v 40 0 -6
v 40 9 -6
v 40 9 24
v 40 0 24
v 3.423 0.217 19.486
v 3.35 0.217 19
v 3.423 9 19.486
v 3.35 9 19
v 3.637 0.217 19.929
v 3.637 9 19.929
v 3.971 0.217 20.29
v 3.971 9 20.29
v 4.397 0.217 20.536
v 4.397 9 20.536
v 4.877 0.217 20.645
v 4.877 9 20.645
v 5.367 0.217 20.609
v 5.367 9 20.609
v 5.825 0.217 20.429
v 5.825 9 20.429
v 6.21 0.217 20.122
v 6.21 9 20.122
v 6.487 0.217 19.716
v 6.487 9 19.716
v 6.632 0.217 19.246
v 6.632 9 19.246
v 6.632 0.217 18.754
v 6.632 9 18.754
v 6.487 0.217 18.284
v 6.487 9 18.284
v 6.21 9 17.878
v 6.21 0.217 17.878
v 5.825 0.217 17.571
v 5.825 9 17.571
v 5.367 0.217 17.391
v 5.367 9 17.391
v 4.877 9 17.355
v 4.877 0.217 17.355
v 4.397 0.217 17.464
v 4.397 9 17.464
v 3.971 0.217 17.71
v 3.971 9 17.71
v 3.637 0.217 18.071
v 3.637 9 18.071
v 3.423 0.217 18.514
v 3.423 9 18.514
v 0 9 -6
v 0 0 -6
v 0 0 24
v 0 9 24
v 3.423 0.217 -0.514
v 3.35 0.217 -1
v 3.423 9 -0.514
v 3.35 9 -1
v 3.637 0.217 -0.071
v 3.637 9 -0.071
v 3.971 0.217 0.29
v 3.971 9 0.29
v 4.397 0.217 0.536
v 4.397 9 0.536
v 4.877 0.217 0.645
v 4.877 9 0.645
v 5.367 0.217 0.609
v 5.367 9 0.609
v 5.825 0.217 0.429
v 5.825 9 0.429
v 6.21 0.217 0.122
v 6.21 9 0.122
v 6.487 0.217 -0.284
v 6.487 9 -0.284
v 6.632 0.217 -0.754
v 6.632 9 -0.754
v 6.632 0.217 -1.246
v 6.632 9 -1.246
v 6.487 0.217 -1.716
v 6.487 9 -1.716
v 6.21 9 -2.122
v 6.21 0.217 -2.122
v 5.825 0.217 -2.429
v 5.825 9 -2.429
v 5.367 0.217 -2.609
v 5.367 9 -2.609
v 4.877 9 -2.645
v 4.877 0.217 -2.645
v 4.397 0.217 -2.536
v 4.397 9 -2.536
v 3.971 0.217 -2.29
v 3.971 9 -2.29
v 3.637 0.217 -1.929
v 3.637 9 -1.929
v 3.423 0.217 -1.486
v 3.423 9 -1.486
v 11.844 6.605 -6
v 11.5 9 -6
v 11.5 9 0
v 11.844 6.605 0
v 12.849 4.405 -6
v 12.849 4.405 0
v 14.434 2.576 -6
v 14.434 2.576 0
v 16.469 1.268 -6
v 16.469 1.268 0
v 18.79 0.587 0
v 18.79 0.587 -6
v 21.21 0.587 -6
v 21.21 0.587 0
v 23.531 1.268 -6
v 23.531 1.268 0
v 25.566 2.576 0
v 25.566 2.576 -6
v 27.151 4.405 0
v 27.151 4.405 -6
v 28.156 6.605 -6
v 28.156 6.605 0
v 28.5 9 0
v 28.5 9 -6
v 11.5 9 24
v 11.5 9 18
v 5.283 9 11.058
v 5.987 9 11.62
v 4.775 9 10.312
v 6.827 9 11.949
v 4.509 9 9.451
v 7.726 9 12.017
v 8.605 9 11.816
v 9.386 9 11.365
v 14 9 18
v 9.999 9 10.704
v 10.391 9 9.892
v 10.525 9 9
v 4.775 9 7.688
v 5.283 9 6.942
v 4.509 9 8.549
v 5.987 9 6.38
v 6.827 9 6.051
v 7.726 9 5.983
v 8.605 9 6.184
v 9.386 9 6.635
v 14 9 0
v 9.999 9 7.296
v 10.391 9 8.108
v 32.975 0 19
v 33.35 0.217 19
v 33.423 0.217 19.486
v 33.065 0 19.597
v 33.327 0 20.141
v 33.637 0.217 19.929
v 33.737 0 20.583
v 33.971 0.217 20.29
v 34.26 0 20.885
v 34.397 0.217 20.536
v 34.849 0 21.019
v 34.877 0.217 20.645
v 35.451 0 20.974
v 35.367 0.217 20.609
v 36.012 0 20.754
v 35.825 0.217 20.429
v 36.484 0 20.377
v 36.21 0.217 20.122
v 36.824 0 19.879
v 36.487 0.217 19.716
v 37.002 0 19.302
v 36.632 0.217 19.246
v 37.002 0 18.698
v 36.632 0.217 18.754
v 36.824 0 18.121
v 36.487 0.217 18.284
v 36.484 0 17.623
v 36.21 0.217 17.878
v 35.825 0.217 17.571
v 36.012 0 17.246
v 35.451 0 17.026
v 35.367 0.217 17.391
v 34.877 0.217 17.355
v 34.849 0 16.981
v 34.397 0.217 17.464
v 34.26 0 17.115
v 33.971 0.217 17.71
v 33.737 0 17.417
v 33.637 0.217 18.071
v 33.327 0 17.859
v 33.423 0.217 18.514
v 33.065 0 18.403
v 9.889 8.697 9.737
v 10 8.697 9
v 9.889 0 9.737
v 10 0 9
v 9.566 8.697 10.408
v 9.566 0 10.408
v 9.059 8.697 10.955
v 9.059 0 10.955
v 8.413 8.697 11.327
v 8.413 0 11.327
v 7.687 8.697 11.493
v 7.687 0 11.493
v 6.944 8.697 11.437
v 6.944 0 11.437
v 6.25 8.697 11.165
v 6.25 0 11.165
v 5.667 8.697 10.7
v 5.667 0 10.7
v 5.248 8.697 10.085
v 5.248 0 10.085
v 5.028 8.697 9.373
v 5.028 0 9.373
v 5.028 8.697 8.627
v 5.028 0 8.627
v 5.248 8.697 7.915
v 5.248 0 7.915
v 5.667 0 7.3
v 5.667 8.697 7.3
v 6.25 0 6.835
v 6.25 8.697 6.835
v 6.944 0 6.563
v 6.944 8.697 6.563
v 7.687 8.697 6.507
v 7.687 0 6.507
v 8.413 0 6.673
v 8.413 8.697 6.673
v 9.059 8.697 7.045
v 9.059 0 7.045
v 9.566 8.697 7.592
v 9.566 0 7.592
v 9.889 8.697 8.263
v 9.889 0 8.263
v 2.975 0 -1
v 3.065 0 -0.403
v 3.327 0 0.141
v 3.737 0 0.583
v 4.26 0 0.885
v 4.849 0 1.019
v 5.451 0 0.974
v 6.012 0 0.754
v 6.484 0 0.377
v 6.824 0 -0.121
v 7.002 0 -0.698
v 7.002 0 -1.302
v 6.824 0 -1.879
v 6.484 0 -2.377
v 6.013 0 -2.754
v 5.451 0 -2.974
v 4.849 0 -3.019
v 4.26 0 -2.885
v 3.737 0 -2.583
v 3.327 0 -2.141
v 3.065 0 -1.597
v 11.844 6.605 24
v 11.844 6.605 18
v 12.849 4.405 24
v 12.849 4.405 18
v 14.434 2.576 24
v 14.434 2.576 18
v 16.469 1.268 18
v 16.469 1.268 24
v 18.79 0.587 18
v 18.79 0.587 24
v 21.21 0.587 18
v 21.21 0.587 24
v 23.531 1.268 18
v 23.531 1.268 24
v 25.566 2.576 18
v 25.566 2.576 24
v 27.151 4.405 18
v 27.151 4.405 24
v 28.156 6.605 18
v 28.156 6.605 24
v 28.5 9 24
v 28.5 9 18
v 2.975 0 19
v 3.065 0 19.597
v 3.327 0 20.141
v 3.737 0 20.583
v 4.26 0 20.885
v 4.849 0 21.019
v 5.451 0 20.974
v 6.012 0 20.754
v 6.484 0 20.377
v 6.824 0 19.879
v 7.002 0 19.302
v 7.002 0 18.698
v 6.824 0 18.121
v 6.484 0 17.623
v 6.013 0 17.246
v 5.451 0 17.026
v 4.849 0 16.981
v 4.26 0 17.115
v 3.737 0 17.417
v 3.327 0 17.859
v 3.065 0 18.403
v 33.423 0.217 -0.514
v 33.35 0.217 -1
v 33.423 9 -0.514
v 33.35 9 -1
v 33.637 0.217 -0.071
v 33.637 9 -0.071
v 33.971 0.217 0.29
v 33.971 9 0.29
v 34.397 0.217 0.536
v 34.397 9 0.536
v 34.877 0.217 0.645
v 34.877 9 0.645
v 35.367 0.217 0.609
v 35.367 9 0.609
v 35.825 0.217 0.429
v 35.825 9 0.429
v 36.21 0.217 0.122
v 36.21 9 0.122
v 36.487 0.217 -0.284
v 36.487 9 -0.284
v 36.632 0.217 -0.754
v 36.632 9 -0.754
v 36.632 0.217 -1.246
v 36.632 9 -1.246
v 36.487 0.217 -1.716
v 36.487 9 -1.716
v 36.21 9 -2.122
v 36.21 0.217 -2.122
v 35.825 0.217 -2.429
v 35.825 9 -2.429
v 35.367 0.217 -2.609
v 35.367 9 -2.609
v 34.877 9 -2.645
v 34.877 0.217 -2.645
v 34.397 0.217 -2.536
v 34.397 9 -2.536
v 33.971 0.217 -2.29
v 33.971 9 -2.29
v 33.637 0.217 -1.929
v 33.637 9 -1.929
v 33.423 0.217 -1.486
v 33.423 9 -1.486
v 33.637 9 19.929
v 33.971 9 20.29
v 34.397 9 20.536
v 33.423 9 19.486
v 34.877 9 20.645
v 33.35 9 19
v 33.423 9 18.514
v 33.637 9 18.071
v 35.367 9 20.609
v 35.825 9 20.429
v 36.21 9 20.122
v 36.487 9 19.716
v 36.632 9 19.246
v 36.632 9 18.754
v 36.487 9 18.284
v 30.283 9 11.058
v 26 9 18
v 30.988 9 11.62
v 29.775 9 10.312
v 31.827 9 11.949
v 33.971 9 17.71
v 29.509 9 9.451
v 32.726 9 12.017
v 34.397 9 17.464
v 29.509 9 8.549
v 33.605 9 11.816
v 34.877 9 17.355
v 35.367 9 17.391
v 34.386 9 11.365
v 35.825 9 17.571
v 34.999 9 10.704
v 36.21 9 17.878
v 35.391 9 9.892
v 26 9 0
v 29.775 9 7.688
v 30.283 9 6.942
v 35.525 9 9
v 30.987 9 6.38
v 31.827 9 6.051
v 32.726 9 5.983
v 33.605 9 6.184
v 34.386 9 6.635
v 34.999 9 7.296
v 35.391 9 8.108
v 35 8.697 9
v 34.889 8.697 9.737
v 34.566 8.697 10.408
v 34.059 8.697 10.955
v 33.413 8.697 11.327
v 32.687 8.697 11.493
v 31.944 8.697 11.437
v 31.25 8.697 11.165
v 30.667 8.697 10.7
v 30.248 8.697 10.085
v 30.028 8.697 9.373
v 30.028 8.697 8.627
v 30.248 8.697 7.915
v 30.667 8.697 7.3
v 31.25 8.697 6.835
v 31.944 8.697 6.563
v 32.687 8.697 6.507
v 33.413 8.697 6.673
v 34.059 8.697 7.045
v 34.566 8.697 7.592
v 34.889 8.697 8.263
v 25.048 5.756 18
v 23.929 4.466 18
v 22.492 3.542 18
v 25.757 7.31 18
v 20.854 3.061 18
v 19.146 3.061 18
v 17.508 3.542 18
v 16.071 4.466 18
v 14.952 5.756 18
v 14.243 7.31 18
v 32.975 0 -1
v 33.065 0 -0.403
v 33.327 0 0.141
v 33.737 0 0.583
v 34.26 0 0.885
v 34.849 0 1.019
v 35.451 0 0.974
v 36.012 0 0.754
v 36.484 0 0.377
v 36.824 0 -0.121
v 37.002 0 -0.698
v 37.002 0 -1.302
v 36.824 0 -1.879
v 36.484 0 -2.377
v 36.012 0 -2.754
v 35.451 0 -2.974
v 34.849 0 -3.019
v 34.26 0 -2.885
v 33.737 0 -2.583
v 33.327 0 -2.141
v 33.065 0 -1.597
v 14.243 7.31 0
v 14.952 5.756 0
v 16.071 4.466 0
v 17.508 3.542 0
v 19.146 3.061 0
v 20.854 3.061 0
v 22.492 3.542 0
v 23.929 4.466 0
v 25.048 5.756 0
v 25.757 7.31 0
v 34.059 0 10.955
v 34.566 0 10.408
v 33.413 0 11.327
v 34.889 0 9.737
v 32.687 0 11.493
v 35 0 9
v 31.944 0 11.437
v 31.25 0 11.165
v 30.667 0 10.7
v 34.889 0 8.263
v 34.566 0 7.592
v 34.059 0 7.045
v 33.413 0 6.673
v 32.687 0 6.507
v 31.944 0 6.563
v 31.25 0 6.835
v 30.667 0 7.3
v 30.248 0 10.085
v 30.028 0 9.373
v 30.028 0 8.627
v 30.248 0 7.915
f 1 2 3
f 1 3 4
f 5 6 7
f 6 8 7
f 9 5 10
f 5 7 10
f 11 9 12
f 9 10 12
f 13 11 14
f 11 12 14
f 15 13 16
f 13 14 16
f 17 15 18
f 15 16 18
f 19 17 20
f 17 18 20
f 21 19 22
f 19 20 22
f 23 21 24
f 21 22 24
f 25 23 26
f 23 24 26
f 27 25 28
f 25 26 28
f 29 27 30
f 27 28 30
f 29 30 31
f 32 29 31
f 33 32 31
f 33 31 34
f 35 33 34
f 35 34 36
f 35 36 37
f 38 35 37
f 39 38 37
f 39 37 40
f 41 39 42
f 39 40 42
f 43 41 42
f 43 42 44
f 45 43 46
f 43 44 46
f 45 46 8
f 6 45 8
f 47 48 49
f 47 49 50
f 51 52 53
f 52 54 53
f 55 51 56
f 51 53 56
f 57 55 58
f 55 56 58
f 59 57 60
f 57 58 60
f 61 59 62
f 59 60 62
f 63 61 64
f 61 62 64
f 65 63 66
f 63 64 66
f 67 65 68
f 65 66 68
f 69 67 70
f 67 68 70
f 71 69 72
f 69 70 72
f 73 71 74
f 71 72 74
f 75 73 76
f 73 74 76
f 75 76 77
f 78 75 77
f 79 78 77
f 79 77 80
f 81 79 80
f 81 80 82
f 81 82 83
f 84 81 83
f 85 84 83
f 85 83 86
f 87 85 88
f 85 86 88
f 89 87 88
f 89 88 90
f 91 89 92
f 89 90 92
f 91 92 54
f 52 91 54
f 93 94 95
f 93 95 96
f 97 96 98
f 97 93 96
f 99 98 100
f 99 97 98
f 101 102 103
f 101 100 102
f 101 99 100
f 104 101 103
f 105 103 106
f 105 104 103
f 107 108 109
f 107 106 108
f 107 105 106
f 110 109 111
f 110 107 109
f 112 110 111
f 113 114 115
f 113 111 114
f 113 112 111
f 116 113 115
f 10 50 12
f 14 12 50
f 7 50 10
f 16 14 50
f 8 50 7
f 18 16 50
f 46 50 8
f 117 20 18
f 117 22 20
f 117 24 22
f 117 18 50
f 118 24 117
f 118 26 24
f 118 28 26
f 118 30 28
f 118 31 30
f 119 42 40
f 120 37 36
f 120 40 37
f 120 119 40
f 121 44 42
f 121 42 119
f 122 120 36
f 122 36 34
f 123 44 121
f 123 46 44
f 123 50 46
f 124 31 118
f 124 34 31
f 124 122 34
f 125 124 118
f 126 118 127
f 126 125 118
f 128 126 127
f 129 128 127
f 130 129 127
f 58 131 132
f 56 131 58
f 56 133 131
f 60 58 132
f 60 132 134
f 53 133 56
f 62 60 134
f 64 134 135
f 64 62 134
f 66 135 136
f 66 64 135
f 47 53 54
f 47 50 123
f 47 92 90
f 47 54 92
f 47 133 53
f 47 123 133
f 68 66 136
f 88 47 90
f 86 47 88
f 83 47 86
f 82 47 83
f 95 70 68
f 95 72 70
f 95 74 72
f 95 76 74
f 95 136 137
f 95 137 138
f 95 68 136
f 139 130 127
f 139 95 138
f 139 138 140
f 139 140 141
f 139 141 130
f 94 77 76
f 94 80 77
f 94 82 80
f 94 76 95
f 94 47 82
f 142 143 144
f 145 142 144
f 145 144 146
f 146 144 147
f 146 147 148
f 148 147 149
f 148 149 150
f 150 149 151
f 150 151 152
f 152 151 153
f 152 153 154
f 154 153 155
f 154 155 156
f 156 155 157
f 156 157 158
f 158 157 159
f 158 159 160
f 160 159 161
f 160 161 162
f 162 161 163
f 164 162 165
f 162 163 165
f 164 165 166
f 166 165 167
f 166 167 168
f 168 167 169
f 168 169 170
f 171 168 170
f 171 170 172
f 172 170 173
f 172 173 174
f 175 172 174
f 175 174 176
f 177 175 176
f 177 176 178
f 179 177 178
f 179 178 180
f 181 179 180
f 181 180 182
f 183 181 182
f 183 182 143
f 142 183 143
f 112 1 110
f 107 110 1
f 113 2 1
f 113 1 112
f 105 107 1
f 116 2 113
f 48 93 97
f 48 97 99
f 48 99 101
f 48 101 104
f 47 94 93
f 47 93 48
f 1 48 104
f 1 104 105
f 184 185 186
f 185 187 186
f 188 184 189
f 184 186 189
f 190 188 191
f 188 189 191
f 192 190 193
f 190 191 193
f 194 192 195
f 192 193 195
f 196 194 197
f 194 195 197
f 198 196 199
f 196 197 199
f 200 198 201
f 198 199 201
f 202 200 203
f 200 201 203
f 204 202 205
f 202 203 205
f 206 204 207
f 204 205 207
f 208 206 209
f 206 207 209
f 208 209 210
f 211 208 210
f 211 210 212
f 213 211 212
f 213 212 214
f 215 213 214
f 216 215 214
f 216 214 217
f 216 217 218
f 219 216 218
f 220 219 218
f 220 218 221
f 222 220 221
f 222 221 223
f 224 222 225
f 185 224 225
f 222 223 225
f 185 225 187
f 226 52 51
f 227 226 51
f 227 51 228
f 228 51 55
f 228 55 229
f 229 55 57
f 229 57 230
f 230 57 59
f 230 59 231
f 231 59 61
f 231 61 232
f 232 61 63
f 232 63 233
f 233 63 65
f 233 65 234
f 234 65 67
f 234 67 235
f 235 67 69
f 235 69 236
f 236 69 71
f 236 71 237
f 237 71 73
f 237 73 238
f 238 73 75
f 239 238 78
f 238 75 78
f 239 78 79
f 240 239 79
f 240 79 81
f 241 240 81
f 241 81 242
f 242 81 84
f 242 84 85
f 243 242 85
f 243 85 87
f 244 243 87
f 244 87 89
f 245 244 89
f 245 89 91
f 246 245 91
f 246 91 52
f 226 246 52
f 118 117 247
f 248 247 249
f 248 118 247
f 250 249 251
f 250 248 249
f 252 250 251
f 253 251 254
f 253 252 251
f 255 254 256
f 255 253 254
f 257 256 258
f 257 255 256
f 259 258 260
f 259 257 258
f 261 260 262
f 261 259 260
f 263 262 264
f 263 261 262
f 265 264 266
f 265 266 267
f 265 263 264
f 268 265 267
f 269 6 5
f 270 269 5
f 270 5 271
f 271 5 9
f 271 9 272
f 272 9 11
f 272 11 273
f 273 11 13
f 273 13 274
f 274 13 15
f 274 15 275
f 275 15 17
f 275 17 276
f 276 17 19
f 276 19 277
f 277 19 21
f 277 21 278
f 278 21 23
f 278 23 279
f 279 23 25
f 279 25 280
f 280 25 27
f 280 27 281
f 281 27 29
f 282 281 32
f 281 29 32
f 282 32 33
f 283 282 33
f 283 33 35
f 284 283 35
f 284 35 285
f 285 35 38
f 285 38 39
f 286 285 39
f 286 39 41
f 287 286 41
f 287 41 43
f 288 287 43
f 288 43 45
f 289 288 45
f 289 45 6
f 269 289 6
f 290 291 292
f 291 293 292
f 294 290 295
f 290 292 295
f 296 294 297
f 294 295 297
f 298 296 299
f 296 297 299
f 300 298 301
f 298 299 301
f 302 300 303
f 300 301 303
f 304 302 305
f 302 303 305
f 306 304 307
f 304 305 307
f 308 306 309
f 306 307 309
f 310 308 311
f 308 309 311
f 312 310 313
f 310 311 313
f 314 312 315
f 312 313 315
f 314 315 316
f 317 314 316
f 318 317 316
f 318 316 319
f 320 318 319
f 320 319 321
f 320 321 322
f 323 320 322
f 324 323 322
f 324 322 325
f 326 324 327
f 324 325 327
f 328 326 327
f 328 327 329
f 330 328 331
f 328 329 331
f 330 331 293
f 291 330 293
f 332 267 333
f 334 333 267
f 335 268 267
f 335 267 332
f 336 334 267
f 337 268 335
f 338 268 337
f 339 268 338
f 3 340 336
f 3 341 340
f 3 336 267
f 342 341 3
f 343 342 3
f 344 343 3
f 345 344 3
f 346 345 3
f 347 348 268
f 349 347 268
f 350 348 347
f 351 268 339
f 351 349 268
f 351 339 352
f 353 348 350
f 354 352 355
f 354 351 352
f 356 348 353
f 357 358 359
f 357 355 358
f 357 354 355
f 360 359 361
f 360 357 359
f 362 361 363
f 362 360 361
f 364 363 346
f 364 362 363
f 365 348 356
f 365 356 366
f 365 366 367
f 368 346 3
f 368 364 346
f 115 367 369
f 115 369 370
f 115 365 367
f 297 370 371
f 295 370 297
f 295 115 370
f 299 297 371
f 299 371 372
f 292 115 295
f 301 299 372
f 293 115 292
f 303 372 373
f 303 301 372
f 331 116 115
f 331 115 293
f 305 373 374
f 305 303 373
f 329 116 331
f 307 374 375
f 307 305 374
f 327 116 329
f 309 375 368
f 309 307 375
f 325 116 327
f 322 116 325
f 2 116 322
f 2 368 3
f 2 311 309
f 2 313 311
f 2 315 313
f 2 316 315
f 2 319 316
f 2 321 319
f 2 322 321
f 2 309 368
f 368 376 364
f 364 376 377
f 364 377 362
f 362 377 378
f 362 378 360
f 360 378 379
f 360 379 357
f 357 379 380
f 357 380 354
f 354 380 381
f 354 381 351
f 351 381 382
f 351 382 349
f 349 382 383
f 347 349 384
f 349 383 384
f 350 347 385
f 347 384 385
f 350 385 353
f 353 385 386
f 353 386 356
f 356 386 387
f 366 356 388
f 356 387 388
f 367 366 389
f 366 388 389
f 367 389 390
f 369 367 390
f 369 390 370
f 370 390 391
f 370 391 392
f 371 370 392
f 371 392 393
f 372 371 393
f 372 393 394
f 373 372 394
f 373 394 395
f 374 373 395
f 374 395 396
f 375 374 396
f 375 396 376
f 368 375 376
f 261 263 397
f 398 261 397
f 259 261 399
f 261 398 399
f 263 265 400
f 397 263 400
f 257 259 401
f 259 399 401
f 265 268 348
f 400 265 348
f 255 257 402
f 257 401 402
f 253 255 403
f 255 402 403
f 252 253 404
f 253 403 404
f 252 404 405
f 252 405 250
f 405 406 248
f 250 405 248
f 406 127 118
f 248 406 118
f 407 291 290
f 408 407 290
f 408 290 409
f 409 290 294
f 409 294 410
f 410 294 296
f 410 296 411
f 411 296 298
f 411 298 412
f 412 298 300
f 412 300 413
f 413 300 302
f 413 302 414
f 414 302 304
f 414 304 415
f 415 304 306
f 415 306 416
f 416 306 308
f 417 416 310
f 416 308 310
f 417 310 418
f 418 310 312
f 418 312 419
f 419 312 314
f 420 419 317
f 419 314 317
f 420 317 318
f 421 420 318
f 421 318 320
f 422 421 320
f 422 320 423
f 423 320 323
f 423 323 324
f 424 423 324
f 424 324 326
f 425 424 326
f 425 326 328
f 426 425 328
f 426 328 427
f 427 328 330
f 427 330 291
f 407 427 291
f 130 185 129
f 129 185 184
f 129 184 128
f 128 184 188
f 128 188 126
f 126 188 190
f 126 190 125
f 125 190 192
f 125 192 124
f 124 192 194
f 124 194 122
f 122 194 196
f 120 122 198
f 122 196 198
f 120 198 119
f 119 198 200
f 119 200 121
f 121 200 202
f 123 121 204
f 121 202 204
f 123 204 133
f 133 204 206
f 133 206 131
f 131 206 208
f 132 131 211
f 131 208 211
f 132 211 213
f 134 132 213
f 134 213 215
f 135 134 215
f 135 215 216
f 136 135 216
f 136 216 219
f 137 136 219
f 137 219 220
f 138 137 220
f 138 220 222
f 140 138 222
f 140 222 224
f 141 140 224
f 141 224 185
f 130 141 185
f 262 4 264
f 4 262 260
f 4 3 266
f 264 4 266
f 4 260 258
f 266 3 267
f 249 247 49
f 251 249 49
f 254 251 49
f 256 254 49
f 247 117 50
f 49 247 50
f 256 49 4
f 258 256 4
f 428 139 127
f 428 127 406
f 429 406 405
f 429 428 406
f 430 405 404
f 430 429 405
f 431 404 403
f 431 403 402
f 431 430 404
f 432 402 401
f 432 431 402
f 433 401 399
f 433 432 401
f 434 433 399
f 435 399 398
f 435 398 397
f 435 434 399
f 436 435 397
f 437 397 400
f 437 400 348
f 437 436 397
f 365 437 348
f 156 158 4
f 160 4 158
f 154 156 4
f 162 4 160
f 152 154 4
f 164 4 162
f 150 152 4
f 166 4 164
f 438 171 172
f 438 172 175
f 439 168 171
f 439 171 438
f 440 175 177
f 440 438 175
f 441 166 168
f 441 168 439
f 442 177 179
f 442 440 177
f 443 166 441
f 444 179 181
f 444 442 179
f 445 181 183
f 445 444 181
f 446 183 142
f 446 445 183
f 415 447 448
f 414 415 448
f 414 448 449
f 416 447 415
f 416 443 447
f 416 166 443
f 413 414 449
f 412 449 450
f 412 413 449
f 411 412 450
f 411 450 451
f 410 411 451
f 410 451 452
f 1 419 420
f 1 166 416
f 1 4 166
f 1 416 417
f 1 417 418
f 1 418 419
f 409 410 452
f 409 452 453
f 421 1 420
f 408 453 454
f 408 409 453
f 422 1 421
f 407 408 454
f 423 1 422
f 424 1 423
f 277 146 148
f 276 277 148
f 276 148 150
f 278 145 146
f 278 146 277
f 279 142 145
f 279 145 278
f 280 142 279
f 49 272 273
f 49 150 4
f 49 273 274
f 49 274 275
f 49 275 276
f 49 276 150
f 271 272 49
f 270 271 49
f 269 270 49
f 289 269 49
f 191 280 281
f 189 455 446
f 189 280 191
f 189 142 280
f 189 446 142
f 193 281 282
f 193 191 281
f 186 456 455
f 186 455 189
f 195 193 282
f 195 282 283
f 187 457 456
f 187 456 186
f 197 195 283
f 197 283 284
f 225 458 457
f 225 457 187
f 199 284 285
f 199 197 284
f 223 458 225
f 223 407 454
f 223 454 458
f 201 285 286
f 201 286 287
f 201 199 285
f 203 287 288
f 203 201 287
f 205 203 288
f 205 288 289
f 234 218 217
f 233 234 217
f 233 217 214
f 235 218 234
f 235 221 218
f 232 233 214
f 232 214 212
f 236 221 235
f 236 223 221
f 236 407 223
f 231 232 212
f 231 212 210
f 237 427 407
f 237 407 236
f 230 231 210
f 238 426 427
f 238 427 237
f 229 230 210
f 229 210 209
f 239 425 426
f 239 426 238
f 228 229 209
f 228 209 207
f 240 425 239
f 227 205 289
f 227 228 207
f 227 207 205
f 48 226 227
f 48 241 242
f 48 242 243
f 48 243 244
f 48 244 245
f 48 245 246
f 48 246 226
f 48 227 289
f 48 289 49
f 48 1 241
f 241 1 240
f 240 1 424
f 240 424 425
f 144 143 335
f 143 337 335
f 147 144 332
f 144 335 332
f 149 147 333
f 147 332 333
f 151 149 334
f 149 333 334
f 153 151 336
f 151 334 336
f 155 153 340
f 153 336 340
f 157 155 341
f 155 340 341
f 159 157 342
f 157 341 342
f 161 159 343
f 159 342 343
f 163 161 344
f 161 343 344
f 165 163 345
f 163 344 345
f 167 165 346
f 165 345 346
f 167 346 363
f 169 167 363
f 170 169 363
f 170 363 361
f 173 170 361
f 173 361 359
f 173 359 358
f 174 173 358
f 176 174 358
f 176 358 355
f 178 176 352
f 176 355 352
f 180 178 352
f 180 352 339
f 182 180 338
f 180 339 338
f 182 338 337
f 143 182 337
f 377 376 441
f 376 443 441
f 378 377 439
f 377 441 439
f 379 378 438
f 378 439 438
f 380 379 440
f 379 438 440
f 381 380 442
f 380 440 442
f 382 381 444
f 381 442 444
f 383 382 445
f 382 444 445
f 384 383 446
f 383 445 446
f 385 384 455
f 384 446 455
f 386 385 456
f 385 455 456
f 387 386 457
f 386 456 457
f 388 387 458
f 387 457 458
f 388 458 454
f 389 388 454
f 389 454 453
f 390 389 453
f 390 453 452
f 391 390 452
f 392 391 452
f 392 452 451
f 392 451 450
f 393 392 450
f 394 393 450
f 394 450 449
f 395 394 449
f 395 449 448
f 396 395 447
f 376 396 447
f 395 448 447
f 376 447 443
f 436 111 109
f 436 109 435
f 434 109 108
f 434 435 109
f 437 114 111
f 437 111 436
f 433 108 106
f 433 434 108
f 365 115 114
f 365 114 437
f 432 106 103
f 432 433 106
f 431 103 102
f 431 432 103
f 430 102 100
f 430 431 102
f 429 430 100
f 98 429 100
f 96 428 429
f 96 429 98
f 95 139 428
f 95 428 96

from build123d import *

# Parameters (mm, degrees)
EXTRUDE_1_DEPTH             = 24
EXTRUDE_1_DEPTH_BACK        = 6
EXTRUDE_2_DEPTH             = 18
HOLE_WIZARD_M41_D           = 3.3
HOLE_WIZARD_M41_DEPTH       = 11.5
HOLE_WIZARD_M41_CSINK_D     = 4.05
HOLE_WIZARD_M41_CSINK_ANGLE = 120
HOLE_WIZARD_M41_TIP         = 0.991420021
HOLE_WIZARD_M61_D           = 5
HOLE_WIZARD_M61_DEPTH       = 17
HOLE_WIZARD_M61_CSINK_D     = 6.05
HOLE_WIZARD_M61_CSINK_ANGLE = 120
HOLE_WIZARD_M61_TIP         = 1.502151548


with BuildPart() as part:
    # Эскиз1 → Бобышка-Вытянуть1 (new, two sides: drawn at the far end of the back side and taken through both)
    with BuildSketch(Plane.XY.offset(-EXTRUDE_1_DEPTH_BACK)):
        with BuildLine():
            Line((28.5, 9), (40, 9))
            Line((40, 9), (40, 0))
            Line((40, 0), (0, 0))
            Line((0, 0), (0, 9))
            Line((0, 9), (11.5, 9))
            ThreePointArc((11.5, 9), (20, 0.5), (28.5, 9))
        make_face()
    extrude(amount=EXTRUDE_1_DEPTH + EXTRUDE_1_DEPTH_BACK)

    # Эскиз3 → Бобышка-Вытянуть2 (add)
    with BuildSketch(Plane.XY):
        with BuildLine():
            Line((11.5, 9), (14, 9))
            ThreePointArc((14, 9), (20, 3), (26, 9))
            Line((26, 9), (28.5, 9))
            ThreePointArc((28.5, 9), (20, 0.5), (11.5, 9))
        make_face()
    extrude(amount=EXTRUDE_2_DEPTH)

    # Отверстие обработанное метчиком M41
    with Locations(Plane.XZ):
        with Locations((35, 19), (35, -1), (5, 19), (5, -1)):
            CounterSinkHole(HOLE_WIZARD_M41_D / 2, HOLE_WIZARD_M41_CSINK_D / 2, depth=HOLE_WIZARD_M41_DEPTH, counter_sink_angle=HOLE_WIZARD_M41_CSINK_ANGLE)
            with Locations((0, 0, -(HOLE_WIZARD_M41_DEPTH + HOLE_WIZARD_M41_TIP / 2))):  # 118° drill point
                Cone(0, HOLE_WIZARD_M41_D / 2, HOLE_WIZARD_M41_TIP, mode=Mode.SUBTRACT)

    # Отверстие обработанное метчиком M61
    with Locations(Plane(origin=(0, 9, 0), x_dir=(-1, 0, 0), z_dir=(0, 1, 0))):
        with Locations((-32.5, 9), (-7.5, 9)):
            CounterSinkHole(HOLE_WIZARD_M61_D / 2, HOLE_WIZARD_M61_CSINK_D / 2, depth=HOLE_WIZARD_M61_DEPTH, counter_sink_angle=HOLE_WIZARD_M61_CSINK_ANGLE)
            with Locations((0, 0, -(HOLE_WIZARD_M61_DEPTH + HOLE_WIZARD_M61_TIP / 2))):  # 118° drill point
                Cone(0, HOLE_WIZARD_M61_D / 2, HOLE_WIZARD_M61_TIP, mode=Mode.SUBTRACT)


solid = part.part
